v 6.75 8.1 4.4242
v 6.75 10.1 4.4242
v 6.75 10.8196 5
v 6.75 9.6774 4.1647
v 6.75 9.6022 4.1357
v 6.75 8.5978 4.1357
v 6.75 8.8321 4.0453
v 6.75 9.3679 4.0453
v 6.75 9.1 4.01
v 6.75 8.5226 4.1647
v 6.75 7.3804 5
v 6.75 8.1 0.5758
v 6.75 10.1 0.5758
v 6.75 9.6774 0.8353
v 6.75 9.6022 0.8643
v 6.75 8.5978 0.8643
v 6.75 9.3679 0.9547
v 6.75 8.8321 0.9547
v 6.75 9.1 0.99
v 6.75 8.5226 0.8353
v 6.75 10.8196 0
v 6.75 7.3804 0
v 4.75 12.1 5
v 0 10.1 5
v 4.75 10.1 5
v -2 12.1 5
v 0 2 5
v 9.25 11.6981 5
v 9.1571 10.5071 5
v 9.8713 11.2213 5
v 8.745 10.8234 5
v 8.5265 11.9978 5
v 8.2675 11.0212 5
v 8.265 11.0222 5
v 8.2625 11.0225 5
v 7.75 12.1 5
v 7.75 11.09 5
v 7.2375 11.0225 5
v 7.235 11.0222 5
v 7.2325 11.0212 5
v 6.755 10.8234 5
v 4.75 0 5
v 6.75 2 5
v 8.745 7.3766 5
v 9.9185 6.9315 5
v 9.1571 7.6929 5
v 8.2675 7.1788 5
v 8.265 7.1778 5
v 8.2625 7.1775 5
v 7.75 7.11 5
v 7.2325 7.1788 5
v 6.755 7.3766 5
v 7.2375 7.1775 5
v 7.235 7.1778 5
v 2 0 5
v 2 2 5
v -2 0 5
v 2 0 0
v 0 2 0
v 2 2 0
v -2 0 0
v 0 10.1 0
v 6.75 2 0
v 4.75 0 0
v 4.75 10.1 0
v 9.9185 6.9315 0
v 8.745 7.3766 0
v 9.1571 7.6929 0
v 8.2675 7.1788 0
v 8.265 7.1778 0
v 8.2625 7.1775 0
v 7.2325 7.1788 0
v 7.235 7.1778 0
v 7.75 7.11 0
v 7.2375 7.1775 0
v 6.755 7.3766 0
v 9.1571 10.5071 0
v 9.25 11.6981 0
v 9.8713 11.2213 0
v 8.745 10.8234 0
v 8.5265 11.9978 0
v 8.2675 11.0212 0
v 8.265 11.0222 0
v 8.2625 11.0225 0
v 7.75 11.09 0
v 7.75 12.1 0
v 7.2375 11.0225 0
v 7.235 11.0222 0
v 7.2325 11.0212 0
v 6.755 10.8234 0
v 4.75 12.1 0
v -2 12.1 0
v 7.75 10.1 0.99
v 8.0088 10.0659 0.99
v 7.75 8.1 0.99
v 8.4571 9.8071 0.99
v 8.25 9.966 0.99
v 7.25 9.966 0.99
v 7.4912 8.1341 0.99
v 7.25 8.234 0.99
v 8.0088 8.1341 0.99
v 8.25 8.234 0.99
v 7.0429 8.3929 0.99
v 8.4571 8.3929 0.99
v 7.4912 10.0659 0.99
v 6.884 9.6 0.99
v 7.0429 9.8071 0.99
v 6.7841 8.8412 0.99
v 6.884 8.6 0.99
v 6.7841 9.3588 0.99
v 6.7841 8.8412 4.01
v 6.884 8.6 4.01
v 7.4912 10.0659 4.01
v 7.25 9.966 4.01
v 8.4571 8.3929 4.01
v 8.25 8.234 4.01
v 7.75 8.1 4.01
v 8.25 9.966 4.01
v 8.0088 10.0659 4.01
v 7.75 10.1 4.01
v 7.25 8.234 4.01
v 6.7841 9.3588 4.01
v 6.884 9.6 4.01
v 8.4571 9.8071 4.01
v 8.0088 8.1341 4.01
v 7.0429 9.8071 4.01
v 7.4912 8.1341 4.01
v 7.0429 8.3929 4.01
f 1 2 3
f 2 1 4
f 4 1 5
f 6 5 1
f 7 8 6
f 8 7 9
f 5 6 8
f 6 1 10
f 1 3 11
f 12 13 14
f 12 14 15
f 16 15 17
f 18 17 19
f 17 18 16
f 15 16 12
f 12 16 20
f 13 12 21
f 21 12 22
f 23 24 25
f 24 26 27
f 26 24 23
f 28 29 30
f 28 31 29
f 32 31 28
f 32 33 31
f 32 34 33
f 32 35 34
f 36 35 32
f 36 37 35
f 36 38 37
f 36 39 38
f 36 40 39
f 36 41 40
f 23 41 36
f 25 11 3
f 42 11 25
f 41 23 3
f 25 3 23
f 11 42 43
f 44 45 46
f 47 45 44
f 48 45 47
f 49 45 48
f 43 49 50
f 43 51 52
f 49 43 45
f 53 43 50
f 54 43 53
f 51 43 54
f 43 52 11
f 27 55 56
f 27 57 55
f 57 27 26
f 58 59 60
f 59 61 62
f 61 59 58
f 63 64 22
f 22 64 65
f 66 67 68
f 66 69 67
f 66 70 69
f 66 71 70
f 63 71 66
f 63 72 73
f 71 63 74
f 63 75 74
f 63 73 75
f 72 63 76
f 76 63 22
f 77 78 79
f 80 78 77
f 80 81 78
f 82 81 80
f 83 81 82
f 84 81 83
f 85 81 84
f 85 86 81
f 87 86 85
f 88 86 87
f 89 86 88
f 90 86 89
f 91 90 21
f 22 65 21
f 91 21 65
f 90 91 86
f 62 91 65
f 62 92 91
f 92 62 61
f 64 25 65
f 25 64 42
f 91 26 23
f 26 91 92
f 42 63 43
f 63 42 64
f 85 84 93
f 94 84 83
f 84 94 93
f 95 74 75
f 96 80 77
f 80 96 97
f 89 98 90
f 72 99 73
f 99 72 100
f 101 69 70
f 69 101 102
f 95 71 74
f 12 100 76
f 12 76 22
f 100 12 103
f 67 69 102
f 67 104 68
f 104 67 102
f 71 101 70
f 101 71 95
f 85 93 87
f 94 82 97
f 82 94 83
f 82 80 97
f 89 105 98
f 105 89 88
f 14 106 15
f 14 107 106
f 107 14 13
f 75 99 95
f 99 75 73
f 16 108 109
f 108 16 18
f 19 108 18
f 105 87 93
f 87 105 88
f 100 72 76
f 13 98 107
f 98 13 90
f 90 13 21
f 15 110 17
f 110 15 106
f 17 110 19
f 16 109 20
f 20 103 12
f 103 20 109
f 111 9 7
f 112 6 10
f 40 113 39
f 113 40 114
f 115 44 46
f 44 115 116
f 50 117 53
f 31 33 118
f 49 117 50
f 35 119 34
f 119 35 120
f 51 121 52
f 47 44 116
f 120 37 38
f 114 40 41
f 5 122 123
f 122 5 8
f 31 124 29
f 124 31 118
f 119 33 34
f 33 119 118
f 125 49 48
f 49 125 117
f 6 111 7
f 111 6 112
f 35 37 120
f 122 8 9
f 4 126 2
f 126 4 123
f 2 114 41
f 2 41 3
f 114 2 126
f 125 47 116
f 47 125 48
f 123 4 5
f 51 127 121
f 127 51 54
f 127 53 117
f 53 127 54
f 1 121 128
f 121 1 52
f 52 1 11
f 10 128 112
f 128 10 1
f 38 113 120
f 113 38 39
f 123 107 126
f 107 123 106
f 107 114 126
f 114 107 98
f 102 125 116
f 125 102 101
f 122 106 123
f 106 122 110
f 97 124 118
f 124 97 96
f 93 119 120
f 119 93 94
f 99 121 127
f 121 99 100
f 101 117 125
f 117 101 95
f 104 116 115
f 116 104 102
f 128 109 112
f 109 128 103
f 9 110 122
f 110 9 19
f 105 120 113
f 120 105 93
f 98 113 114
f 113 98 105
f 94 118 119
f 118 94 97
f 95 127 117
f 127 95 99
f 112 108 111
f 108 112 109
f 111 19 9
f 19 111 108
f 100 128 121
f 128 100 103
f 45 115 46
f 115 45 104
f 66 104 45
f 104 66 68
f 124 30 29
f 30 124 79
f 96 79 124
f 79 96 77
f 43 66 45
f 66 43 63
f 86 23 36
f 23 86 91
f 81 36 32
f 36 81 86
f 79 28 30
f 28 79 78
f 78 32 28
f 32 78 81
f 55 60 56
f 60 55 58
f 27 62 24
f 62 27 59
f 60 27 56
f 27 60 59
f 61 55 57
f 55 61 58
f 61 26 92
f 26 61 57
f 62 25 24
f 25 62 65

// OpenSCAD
// file: filament_jaw.scad
$fn = 24;

default_filament_diameter = 1.75 + 0.1;
default_extrude_depth = 4;
default_shell_thickness = 2;
default_bevel_radius = 1;

filament_jaw();

module filament_jaw(
    filament_diameter = default_filament_diameter,
    extrude_depth = default_extrude_depth,
    shell_thickness = default_shell_thickness,
    bevel_radius = default_bevel_radius,
    wall_size = 10)
{
    filament_jaw_od = filament_diameter + (shell_thickness * 2);
    filament_jaw_or = filament_jaw_od / 2; 
    filament_jaw_id = filament_diameter;
    filament_jaw_ir = filament_jaw_id / 2;

    translate([filament_jaw_or, wall_size - filament_jaw_or, 0])
    difference()
    {
        body();
        hole();
    }

    module body()
    {
        hull()
        {
            translate([
                -filament_jaw_or,
                filament_jaw_or - wall_size,
                0])
            cube([
                shell_thickness,
                wall_size,
                extrude_depth]);

            cylinder(
                r = filament_jaw_or, 
                h = extrude_depth);
        }
        
    }

    module hole()
    {
        translate([0, 0, -0.01])
        cylinder(
            r1 = filament_jaw_ir + bevel_radius,
            r2 = filament_jaw_ir, 
            h = bevel_radius);

        translate([0, 0, extrude_depth - bevel_radius + 0.01])
        cylinder(
            r1 = filament_jaw_ir,
            r2 = filament_jaw_ir  + bevel_radius, 
            h = bevel_radius);

        translate([0, 0, -1])
        cylinder(
            r = filament_jaw_ir, 
            h = extrude_depth + 2);

        rotate(180,0,0)
        translate([-filament_jaw_or, 0, -1])        
        cylinder(
            r = filament_jaw_or, 
            h = extrude_depth + 2,
            $fn = 4);
    }
}
// file: spool_clip.scad
use <filament_jaw.scad>;

default_filament_diameter = 2.0;
default_extrude_depth = 4;
default_shell_thickness = 2;

// going clockwise looking at the clip, with the filament jaw on the right
default_segment_1 = 5;
default_segment_2 = 5;
default_segment_3 = 5;
default_segment_4 = 5;

spool_clip();

module spool_clip(
    filament_diameter = default_filament_diameter,
    extrude_depth = default_extrude_depth,
    shell_thickness = default_shell_thickness,    
    segment_1 = default_segment_1,
    segment_2 = default_segment_2,
    segment_3 = default_segment_3,
    segment_4 = default_segment_4
)
{
    union()
    {
        draw_segment_1();    
        draw_segment_2();    
        draw_segment_3();    
        draw_segment_4();    
        draw_segment_5();    
        draw_filament_jaw();
    }
    
    module draw_segment_1()
    {
        //color([1,0,0])
        cube([
            shell_thickness, 
            segment_1, 
            extrude_depth]);
    }
    
    module draw_segment_2()
    {
        //color([0,1,0])
        translate([
            shell_thickness - segment_2, 
            segment_1 - shell_thickness, 
            0])
        cube([
            segment_2, 
            shell_thickness, 
            extrude_depth]);
    }
    
    module draw_segment_3()
    {
        //color([0,0,1])
        translate([
            -(segment_2), 
            segment_1 - shell_thickness, 
            0])
        cube([
            shell_thickness, 
            segment_3 + shell_thickness, 
            extrude_depth]);
    }
    
    module draw_segment_4()
    {
        //color([1,1,0])
        translate([
            -(segment_2), 
            segment_1 + segment_3, 
            0])
        cube([
            segment_4 + segment_2 + shell_thickness,
            shell_thickness,  
            extrude_depth]);
    }
    
    module draw_segment_5()
    {
        //color([0,1,1])
        translate([
            segment_4 + shell_thickness, 
            0, 
            0])
        difference()
        {
            cube([
                shell_thickness, 
                segment_1 + segment_3 + shell_thickness, 
                extrude_depth]);

            rotate(-45)
            translate([
                0,
                0,
                -1
            ])
            cube([
                shell_thickness * 2, 
                shell_thickness * 2, 
                extrude_depth + 2]);            
        }
    }    

    module draw_filament_jaw()
    {
        diameter = filament_diameter + (shell_thickness * 2);
        radius = diameter / 2;

        //color([1,0,1])
        translate([
            segment_4 + shell_thickness, 
            shell_thickness, 
            0])
        filament_jaw(
            filament_diameter = filament_diameter,
            shell_thickness = shell_thickness,
            extrude_depth = extrude_depth,
            wall_size = segment_1 + segment_3);
    }
}
// main file
use <spool_clip.scad>;

default_filament_diameter = 2.0;
default_extrude_depth = 5;
default_shell_thickness = 2;

// going clockwise looking at the clip, with the filament jaw on the right

spool_clip_monoprice_plaplus();

module spool_clip_monoprice_plaplus(
    filament_diameter = default_filament_diameter,
    extrude_depth = default_extrude_depth,
    shell_thickness = default_shell_thickness,
    segment_1 = default_shell_thickness,
    segment_2 = 2,
    segment_3 = 8.1,
    segment_4 = 2.75
)
{
    spool_clip(
        filament_diameter = filament_diameter,
        extrude_depth = extrude_depth,
        shell_thickness = shell_thickness,
        segment_1 = segment_1,
        segment_2 = segment_2,
        segment_3 = segment_3,
        segment_4 = segment_4);
}
